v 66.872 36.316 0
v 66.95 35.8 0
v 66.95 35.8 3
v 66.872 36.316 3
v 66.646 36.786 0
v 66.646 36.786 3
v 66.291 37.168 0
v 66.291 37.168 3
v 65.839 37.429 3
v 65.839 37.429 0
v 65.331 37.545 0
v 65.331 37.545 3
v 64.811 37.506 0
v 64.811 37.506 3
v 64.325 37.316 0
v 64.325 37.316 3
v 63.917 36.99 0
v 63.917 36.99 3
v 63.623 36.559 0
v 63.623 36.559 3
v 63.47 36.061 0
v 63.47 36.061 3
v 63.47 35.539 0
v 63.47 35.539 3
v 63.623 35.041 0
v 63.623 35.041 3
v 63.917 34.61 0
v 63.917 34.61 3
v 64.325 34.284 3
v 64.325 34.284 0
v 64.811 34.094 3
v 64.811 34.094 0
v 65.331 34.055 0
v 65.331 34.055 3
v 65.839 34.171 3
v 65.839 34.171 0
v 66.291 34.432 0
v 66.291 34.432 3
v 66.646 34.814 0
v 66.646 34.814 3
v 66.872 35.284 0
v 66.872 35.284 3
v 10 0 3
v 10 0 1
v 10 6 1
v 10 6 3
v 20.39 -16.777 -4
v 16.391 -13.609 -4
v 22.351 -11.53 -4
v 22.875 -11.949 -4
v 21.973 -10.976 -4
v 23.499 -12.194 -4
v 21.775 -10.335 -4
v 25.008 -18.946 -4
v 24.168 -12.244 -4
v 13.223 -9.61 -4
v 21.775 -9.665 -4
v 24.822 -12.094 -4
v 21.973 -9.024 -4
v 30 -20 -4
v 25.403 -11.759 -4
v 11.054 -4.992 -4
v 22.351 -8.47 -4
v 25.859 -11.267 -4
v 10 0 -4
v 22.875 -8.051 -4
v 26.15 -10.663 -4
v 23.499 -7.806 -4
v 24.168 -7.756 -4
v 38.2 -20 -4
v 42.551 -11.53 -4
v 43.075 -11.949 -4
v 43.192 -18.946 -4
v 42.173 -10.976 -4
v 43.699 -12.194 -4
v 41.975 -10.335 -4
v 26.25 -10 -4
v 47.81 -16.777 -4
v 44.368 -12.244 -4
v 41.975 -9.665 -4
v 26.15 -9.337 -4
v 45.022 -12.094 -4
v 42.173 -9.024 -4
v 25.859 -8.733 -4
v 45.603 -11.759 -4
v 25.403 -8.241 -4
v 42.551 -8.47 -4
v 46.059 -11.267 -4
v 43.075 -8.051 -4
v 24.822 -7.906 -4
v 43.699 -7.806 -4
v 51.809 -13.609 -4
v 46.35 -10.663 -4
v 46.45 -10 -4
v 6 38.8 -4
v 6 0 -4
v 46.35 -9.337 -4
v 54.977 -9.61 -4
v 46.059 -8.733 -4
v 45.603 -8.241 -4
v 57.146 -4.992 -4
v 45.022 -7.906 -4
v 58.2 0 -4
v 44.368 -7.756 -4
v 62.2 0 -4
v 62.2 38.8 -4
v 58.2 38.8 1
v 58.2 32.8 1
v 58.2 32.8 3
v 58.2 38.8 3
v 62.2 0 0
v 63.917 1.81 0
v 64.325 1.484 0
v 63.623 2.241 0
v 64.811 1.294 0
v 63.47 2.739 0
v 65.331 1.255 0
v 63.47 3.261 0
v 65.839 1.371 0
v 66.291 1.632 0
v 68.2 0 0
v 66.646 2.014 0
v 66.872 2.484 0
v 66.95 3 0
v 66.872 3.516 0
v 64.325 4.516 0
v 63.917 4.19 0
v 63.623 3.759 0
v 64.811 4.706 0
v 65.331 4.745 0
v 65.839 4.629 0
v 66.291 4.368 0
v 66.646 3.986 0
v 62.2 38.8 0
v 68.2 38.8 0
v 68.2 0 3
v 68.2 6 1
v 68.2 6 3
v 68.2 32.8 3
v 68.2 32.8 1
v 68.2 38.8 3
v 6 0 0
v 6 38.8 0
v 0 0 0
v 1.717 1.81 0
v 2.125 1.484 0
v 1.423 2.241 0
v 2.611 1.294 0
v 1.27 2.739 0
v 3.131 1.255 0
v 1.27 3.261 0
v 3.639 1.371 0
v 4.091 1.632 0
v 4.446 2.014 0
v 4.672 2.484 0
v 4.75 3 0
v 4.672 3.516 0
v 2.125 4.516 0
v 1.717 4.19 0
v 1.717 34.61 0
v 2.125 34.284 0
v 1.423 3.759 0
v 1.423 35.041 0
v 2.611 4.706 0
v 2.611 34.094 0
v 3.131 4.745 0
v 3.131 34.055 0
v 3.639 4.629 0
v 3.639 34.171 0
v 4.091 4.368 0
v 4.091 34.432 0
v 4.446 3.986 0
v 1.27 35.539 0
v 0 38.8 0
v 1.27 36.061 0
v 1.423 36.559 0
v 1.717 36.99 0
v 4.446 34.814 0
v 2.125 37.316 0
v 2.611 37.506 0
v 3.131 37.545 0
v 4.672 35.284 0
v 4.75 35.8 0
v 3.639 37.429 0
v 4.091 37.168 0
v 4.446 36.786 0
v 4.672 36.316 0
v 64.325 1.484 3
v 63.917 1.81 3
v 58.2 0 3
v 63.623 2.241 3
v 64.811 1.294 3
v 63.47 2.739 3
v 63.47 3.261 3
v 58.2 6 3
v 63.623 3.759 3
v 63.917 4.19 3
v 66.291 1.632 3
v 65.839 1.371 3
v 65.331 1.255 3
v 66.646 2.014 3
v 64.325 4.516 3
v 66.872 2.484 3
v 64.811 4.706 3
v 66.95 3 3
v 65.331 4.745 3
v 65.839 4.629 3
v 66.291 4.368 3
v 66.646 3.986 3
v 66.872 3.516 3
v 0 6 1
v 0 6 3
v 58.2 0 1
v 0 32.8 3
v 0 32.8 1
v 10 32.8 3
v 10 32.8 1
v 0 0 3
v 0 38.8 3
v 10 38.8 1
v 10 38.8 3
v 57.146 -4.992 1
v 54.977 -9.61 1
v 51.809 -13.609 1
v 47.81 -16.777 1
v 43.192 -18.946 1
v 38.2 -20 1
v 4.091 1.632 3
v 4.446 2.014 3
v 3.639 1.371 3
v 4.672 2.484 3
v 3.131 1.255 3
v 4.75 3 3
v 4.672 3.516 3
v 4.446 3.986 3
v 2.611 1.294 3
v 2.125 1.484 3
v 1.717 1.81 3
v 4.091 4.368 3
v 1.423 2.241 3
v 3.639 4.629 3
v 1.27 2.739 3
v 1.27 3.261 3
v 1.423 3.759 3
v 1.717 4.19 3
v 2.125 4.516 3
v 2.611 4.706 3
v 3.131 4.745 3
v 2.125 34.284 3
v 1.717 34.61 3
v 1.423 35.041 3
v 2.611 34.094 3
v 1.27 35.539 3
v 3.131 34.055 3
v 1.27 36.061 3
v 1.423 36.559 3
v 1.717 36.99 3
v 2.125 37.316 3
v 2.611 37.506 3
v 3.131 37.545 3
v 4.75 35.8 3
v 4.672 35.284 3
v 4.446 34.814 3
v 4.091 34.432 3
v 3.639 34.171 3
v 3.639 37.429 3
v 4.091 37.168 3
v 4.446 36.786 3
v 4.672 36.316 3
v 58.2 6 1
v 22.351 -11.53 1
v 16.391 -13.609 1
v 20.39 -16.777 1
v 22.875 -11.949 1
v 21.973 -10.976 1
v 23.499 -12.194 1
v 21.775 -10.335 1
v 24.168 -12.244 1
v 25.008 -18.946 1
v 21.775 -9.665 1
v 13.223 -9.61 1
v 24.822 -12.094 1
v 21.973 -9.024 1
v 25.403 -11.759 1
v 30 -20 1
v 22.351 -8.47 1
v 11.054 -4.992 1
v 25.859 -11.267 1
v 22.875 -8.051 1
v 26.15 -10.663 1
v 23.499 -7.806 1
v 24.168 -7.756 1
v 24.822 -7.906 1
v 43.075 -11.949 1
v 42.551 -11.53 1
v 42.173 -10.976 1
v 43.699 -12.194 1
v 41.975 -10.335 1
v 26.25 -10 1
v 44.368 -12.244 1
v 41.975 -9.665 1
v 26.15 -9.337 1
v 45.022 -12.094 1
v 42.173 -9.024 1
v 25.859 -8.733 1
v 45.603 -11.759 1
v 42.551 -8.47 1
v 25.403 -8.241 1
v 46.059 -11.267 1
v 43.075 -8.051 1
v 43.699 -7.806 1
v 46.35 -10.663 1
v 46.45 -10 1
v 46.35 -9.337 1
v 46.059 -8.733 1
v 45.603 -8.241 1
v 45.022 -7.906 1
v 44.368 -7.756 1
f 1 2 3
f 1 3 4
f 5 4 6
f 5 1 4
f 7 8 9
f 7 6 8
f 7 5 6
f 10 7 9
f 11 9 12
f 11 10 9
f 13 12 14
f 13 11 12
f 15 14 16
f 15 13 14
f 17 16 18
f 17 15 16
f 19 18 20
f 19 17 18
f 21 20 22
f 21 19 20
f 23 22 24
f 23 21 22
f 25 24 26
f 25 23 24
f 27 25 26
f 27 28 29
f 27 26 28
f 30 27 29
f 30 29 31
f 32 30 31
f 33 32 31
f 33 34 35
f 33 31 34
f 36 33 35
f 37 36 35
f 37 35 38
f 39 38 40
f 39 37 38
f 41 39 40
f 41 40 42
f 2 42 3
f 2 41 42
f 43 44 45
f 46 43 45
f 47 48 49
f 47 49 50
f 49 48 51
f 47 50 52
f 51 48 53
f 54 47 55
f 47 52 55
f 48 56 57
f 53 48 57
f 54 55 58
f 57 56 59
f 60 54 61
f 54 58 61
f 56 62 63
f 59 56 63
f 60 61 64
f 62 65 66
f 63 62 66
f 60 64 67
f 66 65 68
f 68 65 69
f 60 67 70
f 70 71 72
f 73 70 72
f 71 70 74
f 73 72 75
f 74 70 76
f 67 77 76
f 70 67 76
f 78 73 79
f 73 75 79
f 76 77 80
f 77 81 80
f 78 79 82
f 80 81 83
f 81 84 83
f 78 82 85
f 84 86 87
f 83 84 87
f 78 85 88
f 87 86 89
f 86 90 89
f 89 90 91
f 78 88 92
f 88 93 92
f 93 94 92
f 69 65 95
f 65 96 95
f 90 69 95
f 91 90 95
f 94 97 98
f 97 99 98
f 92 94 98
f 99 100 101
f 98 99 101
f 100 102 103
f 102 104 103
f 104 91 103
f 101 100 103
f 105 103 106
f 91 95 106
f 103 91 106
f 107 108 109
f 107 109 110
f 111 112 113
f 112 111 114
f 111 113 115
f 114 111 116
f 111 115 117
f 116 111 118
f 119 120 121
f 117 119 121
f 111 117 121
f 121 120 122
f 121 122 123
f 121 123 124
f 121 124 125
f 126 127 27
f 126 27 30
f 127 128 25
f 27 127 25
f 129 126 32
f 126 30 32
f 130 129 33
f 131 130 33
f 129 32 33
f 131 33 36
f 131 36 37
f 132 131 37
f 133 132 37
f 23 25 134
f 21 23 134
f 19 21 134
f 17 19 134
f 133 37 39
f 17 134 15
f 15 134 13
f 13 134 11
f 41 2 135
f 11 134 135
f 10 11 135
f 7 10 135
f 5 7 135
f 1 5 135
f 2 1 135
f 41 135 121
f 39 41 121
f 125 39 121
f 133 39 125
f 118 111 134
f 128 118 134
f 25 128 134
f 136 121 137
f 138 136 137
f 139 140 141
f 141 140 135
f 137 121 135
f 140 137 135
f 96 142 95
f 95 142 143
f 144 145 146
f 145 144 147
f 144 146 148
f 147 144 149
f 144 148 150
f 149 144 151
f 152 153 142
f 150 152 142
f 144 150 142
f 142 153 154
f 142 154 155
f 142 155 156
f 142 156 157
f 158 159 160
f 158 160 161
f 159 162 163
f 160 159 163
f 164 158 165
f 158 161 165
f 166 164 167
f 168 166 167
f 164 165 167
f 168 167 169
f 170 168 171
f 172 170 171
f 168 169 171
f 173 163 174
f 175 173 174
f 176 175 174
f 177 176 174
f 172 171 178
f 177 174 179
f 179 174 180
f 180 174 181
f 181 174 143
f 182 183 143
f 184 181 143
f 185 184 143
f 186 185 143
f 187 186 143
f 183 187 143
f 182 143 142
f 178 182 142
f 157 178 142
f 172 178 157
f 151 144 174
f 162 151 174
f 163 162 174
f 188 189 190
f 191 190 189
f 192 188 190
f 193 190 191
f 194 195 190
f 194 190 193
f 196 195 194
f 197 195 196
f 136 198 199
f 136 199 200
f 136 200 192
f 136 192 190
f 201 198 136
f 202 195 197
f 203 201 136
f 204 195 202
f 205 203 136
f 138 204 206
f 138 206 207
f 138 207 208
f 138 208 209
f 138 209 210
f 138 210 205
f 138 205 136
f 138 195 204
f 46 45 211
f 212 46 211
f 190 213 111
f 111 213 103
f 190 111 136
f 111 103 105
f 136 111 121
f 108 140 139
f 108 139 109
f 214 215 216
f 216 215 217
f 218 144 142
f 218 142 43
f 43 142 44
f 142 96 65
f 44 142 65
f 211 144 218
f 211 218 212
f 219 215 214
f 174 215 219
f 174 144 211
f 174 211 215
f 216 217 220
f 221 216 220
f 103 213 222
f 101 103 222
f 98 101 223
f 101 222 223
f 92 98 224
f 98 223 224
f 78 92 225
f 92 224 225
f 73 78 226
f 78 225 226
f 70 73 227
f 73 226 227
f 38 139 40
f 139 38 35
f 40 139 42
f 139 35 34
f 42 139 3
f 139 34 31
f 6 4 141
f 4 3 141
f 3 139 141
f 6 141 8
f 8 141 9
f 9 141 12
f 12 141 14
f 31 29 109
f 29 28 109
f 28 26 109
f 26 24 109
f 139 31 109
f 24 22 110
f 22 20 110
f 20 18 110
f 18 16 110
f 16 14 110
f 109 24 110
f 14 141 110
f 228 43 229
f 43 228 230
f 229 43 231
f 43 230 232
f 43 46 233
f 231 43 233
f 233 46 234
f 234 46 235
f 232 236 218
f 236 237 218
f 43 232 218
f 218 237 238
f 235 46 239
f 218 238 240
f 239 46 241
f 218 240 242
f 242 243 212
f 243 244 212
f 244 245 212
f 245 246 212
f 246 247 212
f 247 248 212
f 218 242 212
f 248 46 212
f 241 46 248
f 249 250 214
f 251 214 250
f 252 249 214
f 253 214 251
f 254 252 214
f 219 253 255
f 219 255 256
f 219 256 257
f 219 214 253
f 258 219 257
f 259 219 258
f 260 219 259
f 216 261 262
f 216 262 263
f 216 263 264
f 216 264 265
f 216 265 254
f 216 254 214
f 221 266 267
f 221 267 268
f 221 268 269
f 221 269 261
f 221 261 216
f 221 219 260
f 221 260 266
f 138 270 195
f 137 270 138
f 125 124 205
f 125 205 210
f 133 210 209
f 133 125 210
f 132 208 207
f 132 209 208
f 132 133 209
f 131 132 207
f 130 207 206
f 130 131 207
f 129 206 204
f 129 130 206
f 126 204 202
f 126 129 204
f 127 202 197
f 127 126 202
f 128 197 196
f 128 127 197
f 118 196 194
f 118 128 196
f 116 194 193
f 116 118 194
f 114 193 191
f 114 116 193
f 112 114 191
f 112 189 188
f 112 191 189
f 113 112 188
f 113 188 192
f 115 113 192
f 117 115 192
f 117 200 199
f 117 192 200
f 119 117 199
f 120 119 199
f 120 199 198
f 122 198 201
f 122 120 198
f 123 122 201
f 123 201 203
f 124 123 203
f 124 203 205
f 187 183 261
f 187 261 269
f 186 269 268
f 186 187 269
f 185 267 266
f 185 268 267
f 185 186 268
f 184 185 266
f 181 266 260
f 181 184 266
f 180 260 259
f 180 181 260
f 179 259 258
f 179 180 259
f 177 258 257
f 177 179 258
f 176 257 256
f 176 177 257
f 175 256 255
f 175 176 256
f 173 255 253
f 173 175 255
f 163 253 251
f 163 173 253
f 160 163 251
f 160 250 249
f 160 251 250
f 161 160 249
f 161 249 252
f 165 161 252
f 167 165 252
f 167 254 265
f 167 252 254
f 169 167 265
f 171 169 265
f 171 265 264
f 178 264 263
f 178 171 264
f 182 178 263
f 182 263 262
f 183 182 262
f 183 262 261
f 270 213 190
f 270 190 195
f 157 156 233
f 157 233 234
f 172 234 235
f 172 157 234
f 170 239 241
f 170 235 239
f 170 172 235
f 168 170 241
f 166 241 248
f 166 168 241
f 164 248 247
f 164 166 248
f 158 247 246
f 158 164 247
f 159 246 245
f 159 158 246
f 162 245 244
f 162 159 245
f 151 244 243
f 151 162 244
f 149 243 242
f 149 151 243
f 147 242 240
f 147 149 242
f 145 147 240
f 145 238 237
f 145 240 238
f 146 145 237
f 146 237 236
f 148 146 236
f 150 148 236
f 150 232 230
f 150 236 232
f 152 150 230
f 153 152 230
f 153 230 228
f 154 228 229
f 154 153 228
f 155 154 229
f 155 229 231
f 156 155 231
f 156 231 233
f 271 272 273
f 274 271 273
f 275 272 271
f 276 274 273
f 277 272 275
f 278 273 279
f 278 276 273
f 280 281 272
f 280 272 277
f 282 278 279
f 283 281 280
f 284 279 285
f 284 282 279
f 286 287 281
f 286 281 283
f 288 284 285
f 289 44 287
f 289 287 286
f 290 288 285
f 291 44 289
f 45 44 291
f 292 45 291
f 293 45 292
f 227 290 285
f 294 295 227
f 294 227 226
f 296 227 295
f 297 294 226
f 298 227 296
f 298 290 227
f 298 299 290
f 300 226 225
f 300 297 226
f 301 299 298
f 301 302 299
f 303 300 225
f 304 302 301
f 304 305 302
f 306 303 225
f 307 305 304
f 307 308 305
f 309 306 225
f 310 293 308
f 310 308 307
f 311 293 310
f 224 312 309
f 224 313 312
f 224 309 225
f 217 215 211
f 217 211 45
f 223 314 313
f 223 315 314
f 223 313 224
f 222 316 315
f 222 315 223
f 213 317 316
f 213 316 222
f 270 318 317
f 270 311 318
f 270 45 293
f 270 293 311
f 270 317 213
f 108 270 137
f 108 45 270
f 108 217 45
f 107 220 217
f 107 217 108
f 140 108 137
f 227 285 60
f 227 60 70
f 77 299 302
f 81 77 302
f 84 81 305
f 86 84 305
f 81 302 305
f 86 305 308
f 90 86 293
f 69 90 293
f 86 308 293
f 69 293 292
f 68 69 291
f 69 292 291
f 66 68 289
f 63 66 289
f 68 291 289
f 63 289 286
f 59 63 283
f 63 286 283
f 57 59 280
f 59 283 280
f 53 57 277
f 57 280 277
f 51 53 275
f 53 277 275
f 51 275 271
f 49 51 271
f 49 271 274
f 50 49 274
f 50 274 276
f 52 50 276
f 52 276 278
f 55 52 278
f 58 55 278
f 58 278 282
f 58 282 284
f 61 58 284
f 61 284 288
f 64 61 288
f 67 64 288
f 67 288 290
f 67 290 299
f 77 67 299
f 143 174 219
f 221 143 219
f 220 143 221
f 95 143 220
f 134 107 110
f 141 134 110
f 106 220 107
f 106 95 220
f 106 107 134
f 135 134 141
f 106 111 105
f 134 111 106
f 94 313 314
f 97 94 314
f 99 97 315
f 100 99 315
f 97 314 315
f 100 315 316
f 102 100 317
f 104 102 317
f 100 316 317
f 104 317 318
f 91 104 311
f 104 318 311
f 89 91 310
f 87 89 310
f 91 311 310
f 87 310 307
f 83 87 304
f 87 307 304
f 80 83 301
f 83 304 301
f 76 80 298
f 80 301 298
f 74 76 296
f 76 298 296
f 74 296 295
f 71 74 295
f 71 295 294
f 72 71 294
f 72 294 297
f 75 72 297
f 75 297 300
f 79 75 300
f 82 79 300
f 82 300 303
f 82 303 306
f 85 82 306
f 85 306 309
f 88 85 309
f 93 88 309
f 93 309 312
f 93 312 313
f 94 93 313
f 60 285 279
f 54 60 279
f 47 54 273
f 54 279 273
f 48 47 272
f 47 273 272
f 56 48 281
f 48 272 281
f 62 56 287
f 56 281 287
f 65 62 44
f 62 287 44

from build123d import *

# Parameters (mm, degrees)
ESQUISSE1_W                  = 68.2
ESQUISSE1_H                  = 38.8
BOSS_EXTRU_1_DEPTH           = 1
ESQUISSE3_W                  = 6
ESQUISSE3_H                  = 6
BOSS_EXTRU_2_DEPTH           = 2
ESQUISSE2_W                  = 6
ESQUISSE2_H                  = 6
BOSS_EXTRU_3_DEPTH           = 2
ENL_V_MAT_EXTRU_1_DEPTH      = 79.489999363
ENL_V_MAT_EXTRU_1_DEPTH_BACK = 79.489999363
ESQUISSE5_R                  = 1.75
ESQUISSE6_W                  = 10
ESQUISSE6_H                  = 6
ESQUISSE6_R                  = 1.75
ESQUISSE6_R_2                = 1.8692189
BOSS_EXTRU_4_DEPTH           = 3
ESQUISSE7_W                  = 56.2
ESQUISSE7_H                  = 38.8
BOSS_EXTRU_5_DEPTH           = 4
ESQUISSE8_W                  = 48.2
ESQUISSE8_H                  = 5
BOSS_EXTRU_6_DEPTH           = 20
ESQUISSE9_R                  = 2.25
ENL_V_MAT_EXTRU_2_DEPTH      = 20


with BuildPart() as part:
    # Esquisse1 → Boss.-Extru.1 (new body)
    with BuildSketch(Plane.XY):
        with Locations((34.1, 19.4)):
            Rectangle(ESQUISSE1_W, ESQUISSE1_H)
    extrude(amount=BOSS_EXTRU_1_DEPTH)

    # Esquisse3 → Boss.-Extru.2 (add)
    with BuildSketch(Plane.XY.offset(1)):
        with Locations((65.2, 35.8)):
            Rectangle(ESQUISSE3_W, ESQUISSE3_H)
        with Locations((65.2, 3)):
            Rectangle(ESQUISSE3_W, ESQUISSE3_H)
        with Locations((3, 3)):
            Rectangle(ESQUISSE3_W, ESQUISSE3_H)
    extrude(amount=BOSS_EXTRU_2_DEPTH)

    # Esquisse2 → Boss.-Extru.3 (add)
    with BuildSketch(Plane.XY.offset(1)):
        with Locations((3, 35.8)):
            Rectangle(ESQUISSE2_W, ESQUISSE2_H)
    extrude(amount=BOSS_EXTRU_3_DEPTH)

    # Esquisse5 → Enlèv. mat.-Extru.1 (cut, two sides: drawn at the far end of the back side and taken through both)
    with BuildSketch(Plane.XY.offset(1).offset(-ENL_V_MAT_EXTRU_1_DEPTH_BACK)):
        with Locations((3, 35.8)):
            Circle(ESQUISSE5_R)
        with Locations((3, 3)):
            Circle(ESQUISSE5_R)
        with Locations((65.2, 3)):
            Circle(ESQUISSE5_R)
        with Locations((65.2, 35.8)):
            Circle(ESQUISSE5_R)
    extrude(amount=ENL_V_MAT_EXTRU_1_DEPTH + ENL_V_MAT_EXTRU_1_DEPTH_BACK, mode=Mode.SUBTRACT)

    # Esquisse6 → Boss.-Extru.4 (add)
    # profile 1 of 4: a face of its own
    with BuildSketch(Plane(origin=(0, 0, 0), x_dir=(-1, 0, 0), z_dir=(0, 0, -1))):
        with Locations((-63.2, 3)):
            Rectangle(ESQUISSE6_W, ESQUISSE6_H)
        with Locations(Location((-65.2, 3, 0), (0, 0, 180))):
            Circle(ESQUISSE6_R, mode=Mode.SUBTRACT)
    # profile 2 of 4: a face of its own
    with BuildSketch(Plane(origin=(0, 0, 0), x_dir=(-1, 0, 0), z_dir=(0, 0, -1))):
        with Locations((-63.2, 35.8)):
            Rectangle(ESQUISSE6_W, ESQUISSE6_H)
        with Locations((-65.2, 35.8)):
            Circle(ESQUISSE6_R_2, mode=Mode.SUBTRACT)
    # profile 3 of 4: a face of its own
    with BuildSketch(Plane(origin=(0, 0, 0), x_dir=(-1, 0, 0), z_dir=(0, 0, -1))):
        with Locations((-5, 3)):
            Rectangle(ESQUISSE6_W, ESQUISSE6_H)
        with Locations(Location((-3, 3, 0), (0, 0, 180))):
            Circle(ESQUISSE6_R, mode=Mode.SUBTRACT)
    # profile 4 of 4: a face of its own
    with BuildSketch(Plane(origin=(0, 0, 0), x_dir=(-1, 0, 0), z_dir=(0, 0, -1))):
        with Locations((-5, 35.8)):
            Rectangle(ESQUISSE6_W, ESQUISSE6_H)
        with Locations(Location((-3, 35.8, 0), (0, 0, 180))):
            Circle(ESQUISSE6_R, mode=Mode.SUBTRACT)
    extrude(amount=-BOSS_EXTRU_4_DEPTH)

    # Esquisse7 → Boss.-Extru.5 (add)
    with BuildSketch(Plane(origin=(0, 0, 0), x_dir=(-1, 0, 0), z_dir=(0, 0, -1))):
        with Locations((-34.1, 19.4)):
            Rectangle(ESQUISSE7_W, ESQUISSE7_H)
    extrude(amount=BOSS_EXTRU_5_DEPTH)

    # Esquisse8 → Boss.-Extru.6 (add)
    with BuildSketch(Plane.XZ):
        with Locations((34.1, -1.5)):
            Rectangle(ESQUISSE8_W, ESQUISSE8_H)
    extrude(amount=BOSS_EXTRU_6_DEPTH)

    # Esquisse9 → Enlèv. mat.-Extru.2 (cut)
    with BuildSketch(Plane.XY.offset(1)):
        with BuildLine():
            Line((10, 0), (10, -20))
            Line((10, -20), (30, -20))
            ThreePointArc((30, -20), (16.391056868, -13.608943132), (10, 0))
        make_face()
        with Locations((24, -10)):
            Circle(ESQUISSE9_R)
        with Locations((44.2, -10)):
            Circle(ESQUISSE9_R)
        with BuildLine():
            Line((58.2, -20), (58.2, 0))
            ThreePointArc((58.2, 0), (51.808943132, -13.608943132), (38.2, -20))
            Line((38.2, -20), (58.2, -20))
        make_face()
    extrude(amount=-ENL_V_MAT_EXTRU_2_DEPTH, mode=Mode.SUBTRACT)


solid = part.part
